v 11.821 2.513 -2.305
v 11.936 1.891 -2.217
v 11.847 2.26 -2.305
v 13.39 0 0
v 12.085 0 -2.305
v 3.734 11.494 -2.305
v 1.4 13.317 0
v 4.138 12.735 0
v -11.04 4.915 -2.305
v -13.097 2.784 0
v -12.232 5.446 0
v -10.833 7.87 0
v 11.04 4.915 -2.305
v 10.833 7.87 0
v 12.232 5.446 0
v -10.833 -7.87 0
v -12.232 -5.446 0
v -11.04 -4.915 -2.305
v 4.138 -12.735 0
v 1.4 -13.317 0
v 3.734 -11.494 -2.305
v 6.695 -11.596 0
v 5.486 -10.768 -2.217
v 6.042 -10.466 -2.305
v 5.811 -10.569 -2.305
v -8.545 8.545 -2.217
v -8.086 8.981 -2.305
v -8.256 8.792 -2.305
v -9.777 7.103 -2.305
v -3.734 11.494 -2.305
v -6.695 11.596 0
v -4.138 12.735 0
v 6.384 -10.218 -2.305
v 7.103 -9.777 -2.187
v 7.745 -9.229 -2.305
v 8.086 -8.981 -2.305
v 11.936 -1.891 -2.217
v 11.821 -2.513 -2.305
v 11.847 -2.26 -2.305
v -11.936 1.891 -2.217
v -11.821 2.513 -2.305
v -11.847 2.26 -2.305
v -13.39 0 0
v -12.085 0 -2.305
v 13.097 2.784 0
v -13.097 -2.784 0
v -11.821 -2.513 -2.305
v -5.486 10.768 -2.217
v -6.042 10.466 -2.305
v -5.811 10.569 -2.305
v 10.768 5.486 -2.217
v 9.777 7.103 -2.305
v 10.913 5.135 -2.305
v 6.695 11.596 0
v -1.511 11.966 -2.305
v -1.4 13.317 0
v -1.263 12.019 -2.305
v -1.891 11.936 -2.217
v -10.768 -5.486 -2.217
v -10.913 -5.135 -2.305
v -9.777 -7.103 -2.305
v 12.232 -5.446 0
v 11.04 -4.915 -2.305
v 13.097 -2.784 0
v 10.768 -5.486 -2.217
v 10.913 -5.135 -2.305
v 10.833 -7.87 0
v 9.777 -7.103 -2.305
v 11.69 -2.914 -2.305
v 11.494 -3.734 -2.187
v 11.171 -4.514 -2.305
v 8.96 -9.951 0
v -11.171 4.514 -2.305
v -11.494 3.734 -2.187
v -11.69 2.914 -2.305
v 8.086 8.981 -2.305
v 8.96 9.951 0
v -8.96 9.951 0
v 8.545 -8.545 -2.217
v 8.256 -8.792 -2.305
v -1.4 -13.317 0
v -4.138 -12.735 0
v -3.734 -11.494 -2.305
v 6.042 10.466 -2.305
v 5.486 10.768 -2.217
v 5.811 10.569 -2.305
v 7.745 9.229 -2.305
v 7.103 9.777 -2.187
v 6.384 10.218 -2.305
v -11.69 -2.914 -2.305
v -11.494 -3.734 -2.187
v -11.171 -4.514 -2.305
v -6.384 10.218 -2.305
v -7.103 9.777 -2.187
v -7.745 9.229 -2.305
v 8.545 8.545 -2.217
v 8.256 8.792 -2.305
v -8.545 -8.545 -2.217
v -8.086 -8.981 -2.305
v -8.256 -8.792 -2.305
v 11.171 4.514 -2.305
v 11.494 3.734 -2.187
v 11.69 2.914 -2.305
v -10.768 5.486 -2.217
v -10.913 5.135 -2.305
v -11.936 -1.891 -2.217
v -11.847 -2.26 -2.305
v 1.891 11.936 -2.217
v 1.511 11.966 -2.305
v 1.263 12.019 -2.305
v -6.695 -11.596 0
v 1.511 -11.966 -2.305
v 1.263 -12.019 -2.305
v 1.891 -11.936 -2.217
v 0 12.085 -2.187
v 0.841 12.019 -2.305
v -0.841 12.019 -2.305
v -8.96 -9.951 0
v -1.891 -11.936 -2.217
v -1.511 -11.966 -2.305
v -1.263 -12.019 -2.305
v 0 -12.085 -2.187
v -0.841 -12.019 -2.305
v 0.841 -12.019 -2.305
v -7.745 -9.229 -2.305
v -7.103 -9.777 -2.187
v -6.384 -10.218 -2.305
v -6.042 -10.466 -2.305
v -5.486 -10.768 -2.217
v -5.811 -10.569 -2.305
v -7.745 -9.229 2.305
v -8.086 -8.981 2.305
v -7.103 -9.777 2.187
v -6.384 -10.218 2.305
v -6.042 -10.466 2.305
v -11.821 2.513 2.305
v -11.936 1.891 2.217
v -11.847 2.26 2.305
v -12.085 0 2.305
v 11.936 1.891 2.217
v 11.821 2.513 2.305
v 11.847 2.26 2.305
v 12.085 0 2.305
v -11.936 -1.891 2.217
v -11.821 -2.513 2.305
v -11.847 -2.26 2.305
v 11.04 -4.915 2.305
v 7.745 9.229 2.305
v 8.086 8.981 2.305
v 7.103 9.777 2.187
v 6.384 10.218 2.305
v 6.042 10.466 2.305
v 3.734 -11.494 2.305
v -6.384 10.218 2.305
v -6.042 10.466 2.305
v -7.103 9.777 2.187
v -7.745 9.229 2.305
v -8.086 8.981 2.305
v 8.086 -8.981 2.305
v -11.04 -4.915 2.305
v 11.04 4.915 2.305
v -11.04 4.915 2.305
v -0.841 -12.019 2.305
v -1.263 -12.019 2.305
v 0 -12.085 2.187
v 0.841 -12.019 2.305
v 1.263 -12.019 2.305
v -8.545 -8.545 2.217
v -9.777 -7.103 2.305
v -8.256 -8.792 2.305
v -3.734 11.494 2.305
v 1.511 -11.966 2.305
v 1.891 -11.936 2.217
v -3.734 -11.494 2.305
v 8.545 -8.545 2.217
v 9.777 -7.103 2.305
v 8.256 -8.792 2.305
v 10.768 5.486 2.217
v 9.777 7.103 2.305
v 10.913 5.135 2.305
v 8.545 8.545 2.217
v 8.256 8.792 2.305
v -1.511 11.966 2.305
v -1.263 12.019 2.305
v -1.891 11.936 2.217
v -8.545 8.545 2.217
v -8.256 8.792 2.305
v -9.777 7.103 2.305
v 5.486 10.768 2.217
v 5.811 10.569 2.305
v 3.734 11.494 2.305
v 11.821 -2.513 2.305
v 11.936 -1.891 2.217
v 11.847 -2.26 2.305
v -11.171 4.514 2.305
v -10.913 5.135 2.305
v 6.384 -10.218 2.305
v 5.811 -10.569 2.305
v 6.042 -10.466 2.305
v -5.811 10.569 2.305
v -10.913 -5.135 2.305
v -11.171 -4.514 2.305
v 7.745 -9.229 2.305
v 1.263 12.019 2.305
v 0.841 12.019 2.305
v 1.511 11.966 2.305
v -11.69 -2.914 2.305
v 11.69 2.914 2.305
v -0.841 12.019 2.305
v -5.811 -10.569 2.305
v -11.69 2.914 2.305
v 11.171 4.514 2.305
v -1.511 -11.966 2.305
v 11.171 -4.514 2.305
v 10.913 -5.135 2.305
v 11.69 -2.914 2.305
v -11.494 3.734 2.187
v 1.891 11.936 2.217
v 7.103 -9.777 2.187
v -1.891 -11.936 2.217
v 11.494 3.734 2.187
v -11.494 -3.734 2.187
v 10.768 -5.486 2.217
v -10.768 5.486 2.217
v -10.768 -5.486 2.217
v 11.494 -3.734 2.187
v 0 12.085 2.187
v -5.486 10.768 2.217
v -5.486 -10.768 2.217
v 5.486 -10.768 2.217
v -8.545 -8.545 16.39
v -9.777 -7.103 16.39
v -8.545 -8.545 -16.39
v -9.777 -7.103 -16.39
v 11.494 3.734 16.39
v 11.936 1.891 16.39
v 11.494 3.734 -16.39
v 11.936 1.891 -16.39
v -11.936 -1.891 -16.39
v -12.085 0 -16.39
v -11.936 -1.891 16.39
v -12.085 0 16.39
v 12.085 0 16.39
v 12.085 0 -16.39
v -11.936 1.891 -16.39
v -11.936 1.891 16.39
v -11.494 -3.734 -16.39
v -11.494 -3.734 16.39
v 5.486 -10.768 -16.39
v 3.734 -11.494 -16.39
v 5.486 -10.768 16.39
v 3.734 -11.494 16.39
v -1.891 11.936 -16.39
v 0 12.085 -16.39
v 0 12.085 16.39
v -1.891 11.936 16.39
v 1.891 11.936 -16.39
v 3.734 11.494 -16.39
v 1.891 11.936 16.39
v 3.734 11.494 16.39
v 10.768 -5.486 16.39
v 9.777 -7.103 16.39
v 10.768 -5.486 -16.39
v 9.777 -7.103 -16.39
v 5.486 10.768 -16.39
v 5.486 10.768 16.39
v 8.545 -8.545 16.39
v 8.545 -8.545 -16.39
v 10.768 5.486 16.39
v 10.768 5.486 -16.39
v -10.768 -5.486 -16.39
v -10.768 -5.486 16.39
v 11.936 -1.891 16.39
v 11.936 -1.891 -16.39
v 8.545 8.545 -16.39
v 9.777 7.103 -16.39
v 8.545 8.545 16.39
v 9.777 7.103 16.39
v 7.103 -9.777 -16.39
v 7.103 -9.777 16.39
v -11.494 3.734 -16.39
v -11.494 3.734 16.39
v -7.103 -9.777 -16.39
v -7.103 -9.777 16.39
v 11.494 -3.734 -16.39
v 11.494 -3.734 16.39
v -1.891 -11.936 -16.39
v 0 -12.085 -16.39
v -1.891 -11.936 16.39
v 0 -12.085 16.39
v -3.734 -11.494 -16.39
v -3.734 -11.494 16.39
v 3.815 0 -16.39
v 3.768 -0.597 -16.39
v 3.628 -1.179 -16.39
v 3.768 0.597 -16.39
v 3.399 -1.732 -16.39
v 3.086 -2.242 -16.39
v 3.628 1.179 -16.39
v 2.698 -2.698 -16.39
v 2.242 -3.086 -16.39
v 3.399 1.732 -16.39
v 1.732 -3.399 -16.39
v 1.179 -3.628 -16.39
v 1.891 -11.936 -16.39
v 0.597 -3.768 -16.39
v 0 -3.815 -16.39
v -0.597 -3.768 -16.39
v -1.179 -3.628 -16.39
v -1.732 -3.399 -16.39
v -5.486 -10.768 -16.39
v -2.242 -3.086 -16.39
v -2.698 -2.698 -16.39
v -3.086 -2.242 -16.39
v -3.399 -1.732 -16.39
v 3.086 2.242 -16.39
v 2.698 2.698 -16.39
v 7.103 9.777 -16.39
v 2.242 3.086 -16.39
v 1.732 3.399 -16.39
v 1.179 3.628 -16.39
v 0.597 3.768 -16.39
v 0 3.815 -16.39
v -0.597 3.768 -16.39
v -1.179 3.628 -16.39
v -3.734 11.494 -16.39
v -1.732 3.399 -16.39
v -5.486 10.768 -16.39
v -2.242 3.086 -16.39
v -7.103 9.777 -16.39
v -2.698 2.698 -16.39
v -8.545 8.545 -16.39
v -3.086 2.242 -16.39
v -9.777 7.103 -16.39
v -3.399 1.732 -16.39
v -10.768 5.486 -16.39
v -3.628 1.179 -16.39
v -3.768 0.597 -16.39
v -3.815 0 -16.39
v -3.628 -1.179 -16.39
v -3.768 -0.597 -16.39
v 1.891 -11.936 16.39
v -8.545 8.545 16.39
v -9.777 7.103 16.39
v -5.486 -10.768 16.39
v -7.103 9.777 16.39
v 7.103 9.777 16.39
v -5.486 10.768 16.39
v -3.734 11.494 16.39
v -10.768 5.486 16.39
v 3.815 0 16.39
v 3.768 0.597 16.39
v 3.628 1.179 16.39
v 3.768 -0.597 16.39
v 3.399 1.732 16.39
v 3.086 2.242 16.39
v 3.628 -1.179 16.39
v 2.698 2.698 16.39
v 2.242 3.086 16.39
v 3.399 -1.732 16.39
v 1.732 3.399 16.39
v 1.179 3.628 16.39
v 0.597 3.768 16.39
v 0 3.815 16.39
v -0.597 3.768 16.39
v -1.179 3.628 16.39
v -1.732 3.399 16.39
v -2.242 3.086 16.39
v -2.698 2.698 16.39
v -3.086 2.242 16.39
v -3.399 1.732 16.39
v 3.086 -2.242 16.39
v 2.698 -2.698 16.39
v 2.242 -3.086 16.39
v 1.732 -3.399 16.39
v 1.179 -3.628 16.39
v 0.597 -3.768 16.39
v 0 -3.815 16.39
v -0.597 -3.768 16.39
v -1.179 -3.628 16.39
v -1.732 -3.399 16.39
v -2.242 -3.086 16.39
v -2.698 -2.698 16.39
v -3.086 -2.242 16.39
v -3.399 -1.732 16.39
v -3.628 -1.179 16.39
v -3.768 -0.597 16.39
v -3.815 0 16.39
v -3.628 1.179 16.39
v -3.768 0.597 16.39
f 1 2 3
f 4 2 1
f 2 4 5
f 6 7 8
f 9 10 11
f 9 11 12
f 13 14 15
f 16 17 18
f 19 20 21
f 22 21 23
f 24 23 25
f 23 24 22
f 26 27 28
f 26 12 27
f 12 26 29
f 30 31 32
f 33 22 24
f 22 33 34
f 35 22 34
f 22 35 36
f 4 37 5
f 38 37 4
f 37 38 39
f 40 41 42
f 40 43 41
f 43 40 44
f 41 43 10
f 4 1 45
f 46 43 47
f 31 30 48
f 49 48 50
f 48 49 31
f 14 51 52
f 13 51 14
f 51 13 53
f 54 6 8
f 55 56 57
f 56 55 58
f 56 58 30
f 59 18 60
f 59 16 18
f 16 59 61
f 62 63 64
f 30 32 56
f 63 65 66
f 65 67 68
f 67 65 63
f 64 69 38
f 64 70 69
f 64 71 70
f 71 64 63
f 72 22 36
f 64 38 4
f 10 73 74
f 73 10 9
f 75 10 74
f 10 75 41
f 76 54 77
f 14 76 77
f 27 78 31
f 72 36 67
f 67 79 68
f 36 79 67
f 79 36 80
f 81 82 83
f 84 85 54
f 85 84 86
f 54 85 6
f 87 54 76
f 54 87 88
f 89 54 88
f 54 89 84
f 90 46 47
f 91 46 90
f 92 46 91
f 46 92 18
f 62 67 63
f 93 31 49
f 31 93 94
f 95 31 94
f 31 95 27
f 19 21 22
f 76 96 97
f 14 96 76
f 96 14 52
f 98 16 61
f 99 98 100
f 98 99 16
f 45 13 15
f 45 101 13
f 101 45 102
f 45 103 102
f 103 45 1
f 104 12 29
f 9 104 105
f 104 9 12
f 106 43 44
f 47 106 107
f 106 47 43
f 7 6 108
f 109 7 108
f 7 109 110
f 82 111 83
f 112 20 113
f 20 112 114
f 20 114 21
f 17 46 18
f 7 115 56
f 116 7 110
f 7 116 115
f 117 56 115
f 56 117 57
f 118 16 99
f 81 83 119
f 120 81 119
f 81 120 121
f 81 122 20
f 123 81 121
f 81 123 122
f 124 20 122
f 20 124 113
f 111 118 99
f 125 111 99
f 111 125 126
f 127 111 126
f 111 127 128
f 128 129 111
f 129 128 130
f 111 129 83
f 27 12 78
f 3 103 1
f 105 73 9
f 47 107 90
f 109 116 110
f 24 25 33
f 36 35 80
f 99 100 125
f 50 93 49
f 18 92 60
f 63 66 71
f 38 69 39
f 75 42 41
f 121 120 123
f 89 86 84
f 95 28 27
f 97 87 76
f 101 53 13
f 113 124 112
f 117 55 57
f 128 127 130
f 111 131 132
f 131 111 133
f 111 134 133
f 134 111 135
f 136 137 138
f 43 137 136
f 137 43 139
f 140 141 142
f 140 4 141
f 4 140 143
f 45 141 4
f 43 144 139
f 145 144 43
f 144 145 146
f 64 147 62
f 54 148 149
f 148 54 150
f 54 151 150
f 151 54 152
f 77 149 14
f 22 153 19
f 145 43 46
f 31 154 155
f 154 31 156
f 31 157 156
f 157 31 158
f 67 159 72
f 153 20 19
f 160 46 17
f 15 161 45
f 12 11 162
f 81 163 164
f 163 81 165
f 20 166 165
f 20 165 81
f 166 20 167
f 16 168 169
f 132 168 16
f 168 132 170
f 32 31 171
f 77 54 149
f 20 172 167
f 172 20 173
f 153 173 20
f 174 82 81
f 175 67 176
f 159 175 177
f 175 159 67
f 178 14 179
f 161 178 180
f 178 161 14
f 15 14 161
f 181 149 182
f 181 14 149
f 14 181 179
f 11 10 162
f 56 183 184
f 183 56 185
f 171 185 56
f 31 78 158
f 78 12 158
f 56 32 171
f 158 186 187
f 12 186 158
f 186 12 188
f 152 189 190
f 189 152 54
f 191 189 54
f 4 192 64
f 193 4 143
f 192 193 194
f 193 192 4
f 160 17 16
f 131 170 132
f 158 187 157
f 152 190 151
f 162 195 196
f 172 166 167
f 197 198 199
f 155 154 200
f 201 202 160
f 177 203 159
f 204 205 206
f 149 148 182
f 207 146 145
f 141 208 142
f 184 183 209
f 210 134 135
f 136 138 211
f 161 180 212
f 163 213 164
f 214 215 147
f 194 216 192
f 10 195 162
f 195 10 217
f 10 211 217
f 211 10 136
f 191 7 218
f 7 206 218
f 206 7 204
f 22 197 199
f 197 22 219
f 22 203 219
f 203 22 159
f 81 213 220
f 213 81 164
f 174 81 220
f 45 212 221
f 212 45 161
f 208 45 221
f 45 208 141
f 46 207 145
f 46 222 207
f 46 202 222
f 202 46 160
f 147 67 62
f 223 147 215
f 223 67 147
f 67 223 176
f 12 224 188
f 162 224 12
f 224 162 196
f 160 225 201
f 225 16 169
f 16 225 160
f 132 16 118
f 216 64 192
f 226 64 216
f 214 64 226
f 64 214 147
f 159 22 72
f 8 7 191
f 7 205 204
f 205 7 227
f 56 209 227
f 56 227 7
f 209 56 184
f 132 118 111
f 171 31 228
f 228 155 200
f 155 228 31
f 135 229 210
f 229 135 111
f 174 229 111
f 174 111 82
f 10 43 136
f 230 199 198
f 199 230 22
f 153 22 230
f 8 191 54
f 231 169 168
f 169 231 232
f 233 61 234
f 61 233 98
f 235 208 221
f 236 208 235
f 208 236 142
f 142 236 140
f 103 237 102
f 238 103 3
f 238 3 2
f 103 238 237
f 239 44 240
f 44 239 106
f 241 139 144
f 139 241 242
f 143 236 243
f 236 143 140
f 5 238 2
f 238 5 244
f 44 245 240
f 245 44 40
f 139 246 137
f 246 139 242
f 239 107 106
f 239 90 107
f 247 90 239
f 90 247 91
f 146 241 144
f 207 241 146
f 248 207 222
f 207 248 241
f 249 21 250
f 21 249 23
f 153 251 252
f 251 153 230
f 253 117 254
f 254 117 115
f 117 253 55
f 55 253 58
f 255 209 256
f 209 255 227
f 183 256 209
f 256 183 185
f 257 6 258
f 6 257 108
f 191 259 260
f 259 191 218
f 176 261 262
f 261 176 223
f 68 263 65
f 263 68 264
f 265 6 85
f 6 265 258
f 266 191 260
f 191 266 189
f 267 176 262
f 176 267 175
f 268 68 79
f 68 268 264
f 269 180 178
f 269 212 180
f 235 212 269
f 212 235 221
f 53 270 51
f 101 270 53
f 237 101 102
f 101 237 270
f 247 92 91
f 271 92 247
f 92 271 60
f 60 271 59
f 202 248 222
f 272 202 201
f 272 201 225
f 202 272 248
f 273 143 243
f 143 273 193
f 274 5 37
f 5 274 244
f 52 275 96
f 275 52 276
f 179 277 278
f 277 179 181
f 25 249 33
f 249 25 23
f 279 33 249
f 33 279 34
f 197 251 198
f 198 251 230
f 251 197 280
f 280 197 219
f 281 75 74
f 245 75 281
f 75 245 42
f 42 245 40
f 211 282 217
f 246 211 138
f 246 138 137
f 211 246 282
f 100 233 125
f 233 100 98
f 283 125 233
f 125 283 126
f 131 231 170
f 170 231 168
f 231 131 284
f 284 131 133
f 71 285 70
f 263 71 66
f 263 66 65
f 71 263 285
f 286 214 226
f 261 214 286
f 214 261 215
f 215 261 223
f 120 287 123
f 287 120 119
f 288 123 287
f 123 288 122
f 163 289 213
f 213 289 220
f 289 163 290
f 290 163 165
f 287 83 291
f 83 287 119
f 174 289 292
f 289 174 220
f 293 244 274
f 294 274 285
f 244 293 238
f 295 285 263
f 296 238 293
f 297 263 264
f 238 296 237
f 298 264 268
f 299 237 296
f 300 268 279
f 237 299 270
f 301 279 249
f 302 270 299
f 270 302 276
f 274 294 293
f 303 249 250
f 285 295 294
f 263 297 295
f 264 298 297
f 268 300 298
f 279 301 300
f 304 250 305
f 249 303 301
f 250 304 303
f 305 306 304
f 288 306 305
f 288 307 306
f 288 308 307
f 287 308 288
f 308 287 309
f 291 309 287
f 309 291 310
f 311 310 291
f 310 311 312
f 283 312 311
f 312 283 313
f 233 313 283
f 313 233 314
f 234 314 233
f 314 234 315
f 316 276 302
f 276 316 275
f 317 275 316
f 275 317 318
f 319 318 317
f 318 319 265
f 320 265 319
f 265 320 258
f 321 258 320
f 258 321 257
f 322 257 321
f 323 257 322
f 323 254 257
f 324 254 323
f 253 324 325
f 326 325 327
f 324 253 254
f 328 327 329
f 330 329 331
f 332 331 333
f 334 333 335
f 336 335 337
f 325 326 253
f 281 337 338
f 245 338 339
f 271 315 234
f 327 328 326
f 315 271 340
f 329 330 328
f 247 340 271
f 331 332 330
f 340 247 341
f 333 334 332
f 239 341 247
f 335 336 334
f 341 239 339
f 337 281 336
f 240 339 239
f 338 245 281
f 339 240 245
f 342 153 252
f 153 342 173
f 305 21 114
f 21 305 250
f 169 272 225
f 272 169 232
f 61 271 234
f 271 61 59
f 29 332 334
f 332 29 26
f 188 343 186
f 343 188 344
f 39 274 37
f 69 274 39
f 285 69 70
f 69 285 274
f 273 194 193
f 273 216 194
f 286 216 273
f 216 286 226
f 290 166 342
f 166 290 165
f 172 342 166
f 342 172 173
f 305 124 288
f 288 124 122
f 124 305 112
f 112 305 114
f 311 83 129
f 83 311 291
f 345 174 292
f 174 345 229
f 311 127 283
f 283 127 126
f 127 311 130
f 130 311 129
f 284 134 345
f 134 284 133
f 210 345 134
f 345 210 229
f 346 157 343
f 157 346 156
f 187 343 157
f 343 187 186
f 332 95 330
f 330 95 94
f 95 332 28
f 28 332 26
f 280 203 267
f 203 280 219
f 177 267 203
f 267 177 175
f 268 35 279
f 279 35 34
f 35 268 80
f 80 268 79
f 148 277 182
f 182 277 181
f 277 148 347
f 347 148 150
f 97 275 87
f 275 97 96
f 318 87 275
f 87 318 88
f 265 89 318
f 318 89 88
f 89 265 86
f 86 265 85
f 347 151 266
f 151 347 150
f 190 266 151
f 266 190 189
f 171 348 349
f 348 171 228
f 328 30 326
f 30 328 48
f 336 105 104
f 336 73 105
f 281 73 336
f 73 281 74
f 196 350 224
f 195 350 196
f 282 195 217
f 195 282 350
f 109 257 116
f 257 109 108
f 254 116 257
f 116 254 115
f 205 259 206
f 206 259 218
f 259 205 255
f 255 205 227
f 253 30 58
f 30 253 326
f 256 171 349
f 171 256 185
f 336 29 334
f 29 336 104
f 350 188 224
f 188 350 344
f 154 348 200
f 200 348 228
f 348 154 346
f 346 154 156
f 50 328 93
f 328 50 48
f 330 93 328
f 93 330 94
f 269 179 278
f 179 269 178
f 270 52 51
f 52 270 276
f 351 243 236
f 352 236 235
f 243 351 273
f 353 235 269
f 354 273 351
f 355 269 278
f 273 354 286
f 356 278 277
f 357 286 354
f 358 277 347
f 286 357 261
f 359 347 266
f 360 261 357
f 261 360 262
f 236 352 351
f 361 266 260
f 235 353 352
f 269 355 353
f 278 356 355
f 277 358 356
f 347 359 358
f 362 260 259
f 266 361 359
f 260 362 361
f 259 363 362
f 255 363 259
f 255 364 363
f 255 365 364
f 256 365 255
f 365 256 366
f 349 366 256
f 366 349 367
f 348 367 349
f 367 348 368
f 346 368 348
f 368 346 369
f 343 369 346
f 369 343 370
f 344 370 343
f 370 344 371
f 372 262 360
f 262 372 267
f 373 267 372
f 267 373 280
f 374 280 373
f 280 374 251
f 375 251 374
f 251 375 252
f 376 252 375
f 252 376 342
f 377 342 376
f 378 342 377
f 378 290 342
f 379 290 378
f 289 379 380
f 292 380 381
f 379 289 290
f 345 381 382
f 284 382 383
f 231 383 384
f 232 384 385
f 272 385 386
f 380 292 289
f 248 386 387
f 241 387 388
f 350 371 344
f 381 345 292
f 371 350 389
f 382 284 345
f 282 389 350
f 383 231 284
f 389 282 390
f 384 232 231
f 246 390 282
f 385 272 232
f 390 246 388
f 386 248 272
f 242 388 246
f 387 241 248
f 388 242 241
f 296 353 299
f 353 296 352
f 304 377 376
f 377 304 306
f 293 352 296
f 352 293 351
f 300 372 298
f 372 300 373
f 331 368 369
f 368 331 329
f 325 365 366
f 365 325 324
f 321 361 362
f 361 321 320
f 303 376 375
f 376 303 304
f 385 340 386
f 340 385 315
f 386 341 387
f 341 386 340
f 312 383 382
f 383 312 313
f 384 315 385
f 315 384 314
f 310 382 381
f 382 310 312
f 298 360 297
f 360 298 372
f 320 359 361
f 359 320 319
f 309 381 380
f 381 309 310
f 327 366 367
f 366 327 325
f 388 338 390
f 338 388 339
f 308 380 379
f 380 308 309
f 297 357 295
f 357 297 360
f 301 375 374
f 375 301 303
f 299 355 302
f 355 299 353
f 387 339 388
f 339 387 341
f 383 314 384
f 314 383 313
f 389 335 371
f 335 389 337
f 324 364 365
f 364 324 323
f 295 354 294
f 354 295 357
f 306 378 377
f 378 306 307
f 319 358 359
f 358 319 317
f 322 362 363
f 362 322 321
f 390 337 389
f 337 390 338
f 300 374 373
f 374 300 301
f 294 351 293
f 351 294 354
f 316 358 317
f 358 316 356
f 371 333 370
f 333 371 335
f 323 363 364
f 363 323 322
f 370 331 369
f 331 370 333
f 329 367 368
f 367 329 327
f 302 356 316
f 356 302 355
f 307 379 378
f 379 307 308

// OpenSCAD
//inner diameter of hole circle is 7.63 mm
//diameter of  void is 31.7mm
//diameter of flange is 37.4mm
//height of flange is 1.06mm
//height of flange plus wall is 8.6mm
//height at center 9.2mm

module flangeod(od1,od2,fn,height,delta)
     {
    cylinder(h=height/2.0, r1=od1, r2=od2);
    translate([0,0,height/2])
        cylinder(h=height/2.0, r1=od2, r2=od1);
    }
    

module flange(od1,od2,id,fn=40,height=1,delta=0.1){
difference()
//   linear_extrude(height=height) circle(r=od/2.0,$fn=fn);
{
    flangeod(od1,od2,fn,height,delta);
    translate([0,0,-height-delta/2]) 
    //linear_extrude(height=2*height+4*delta) 
    cylinder(r1=id,r2=id,h=2*height+delta,$fn=fn);
}
}

module hollowCylinder(od,id,height,delta,fn=40){
difference(){
    linear_extrude(height=height) circle(r=od/2.0,$fn=fn);
translate([0,0,-delta]) linear_extrude(height=(height+2*delta)) circle(r=id/2.0,$fn=fn);
}
}

translate([0,0,-2.305])
//flange(od1=34.78/2,od2=24,17/2,id=7.63,height=4.61,fn=40);
flange(od1=24.17/2,od2=26.78/2,id=7.63,height=4.61,fn=40);
translate([0,0,-16.39]){
hollowCylinder(od=24.17,id=7.63,height=32.78,delta=0.5);
zoffset = 9.2-2.5;
}
//
//difference()
////   linear_extrude(height=height) circle(r=od/2.0,$fn=fn);
//{
//  flangeod(od1=34.78,od2=34.78,fn=fn,height=4.61,delta=delta);
////    translate([0,0,-height-delta]) //
//    //linear_extrude(height=2*height+4*delta) 
//    cylinder(r1=7.63,r2=7.63,h=20,$fn=fn,center=true);
//}


//translate([0,8,zoffset]) rotate([0,180,0]) letterExtrude("Farley",size=8,height=zoffset);
//translate([0,0,zoffset]) rotate([0,180,0]) letterExtrude("Pepper",size=8,height=zoffset);
//translate([0,-8,zoffset]) rotate([0,180,0]) letterExtrude("Shaker",size=8,height=zoffset);
